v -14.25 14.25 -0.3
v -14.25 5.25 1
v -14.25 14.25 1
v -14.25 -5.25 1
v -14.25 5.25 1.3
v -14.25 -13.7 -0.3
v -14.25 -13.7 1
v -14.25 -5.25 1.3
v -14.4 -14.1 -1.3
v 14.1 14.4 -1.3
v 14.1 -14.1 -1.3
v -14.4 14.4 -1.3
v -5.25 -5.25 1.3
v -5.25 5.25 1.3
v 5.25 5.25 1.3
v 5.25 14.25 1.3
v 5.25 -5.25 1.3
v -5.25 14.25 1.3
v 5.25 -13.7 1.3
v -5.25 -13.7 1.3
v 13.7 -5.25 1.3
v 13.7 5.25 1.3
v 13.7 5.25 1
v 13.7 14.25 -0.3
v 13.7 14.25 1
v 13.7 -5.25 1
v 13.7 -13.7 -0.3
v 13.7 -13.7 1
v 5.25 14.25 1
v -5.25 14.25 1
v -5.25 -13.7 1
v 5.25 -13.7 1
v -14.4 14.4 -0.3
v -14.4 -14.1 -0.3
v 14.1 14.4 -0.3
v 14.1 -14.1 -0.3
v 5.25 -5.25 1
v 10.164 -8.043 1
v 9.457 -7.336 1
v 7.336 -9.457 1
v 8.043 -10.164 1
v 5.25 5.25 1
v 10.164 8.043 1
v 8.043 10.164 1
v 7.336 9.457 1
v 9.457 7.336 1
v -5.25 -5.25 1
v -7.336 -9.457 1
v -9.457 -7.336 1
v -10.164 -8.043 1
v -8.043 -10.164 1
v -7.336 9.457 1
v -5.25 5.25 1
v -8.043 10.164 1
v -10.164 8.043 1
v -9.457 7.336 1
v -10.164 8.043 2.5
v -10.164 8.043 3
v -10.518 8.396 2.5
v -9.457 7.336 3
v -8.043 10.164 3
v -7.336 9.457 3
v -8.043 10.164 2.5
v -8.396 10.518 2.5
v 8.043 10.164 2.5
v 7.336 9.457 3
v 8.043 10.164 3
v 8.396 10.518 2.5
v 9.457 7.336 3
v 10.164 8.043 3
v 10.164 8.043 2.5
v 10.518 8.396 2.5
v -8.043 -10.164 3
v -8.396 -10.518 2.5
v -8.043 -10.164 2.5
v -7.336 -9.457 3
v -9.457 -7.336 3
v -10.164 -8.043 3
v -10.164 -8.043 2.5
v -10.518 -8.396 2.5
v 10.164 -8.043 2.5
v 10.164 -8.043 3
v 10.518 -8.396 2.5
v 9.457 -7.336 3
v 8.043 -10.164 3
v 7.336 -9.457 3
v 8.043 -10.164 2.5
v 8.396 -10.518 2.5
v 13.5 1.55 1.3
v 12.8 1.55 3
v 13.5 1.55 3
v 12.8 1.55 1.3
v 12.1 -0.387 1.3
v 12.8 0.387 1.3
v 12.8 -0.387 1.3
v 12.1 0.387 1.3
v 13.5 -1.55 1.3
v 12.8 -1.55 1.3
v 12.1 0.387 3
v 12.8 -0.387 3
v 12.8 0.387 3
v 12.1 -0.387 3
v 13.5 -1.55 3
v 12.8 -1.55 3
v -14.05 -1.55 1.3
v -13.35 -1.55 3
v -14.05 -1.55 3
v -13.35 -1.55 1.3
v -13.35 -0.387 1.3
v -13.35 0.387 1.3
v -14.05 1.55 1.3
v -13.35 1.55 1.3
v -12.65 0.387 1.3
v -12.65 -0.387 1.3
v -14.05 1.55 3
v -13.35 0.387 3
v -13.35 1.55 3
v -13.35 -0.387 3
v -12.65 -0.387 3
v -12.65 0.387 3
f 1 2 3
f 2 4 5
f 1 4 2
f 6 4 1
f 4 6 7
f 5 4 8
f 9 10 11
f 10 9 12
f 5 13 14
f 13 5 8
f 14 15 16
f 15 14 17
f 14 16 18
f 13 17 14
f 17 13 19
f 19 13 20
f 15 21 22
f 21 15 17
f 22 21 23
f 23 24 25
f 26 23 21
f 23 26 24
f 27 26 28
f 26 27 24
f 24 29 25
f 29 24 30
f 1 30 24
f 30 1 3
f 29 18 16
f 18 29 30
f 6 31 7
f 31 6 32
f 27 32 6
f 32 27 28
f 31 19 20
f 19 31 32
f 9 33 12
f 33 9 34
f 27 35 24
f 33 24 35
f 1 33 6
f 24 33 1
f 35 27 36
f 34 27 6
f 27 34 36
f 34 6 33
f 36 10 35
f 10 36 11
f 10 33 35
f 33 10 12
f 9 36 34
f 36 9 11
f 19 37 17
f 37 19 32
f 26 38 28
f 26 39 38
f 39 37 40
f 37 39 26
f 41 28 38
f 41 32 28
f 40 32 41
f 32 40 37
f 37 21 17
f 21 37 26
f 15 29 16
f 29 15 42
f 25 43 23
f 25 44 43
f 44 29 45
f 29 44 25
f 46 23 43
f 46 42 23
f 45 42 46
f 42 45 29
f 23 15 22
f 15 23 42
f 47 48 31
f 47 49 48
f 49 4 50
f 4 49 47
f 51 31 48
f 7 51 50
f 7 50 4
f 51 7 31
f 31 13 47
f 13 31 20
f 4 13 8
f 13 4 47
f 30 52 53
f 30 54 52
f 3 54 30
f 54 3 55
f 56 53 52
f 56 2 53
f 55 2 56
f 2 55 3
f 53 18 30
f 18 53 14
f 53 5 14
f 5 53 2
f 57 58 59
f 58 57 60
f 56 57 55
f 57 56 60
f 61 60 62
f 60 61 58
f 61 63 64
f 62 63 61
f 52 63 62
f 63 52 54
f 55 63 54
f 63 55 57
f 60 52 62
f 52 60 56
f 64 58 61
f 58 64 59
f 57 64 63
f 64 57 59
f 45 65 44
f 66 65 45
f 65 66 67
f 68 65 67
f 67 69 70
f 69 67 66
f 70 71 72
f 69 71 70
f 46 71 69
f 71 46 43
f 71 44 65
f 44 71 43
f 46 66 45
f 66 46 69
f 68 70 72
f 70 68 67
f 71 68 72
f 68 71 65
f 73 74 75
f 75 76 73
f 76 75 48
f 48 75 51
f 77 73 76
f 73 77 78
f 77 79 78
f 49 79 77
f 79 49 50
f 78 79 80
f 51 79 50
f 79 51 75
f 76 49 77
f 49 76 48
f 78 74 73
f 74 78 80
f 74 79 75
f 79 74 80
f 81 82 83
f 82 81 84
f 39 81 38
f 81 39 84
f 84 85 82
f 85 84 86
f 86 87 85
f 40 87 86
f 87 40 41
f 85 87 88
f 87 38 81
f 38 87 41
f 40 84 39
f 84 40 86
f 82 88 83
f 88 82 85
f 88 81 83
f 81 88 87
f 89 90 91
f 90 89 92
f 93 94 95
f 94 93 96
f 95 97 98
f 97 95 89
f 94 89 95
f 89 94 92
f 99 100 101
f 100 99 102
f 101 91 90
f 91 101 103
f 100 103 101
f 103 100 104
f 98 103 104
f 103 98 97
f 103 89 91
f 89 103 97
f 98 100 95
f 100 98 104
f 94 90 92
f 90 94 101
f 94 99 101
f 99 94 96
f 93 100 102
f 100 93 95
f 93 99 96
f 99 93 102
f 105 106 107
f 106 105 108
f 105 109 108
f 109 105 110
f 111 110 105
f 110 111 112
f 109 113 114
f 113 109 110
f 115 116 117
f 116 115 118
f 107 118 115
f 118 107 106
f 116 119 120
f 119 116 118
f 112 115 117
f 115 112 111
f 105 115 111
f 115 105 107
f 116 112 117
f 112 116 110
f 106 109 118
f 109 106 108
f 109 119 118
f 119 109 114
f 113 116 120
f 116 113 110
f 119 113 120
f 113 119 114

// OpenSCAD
// Copyright (c) Tailscale Inc
// SPDX-License-Identifier: BSD-3-Clause
//
// Framework Desktop Tile with Tailscale Logo
//
// Color scheme:
// - Color 0 (white): tile base
// - Color 1 (gray): corner dots + top center dot
// - Color 2 (black): T-shaped dots (entire middle row + center bottom dot)
//
// Export:
// 1. Run ./export-tailscale-tile.sh to generate all STL files
// 2. Import all STLs into slicer, assign colors
//
// Adapted from https://www.printables.com/model/1397765-framework-desktop-tile-generator CC BY 4.0 https://creativecommons.org/licenses/by/4.0/

// Multi-color export control
// Colors: 0 = white (base), 1 = gray (corner dots), 2 = black (T-shape)
current_color = -1;  // -1 = show all (preview), 0/1/2 = export single color

// Tile dimensions
tile_size = 28.5;      // Width and height of the tile
tile_thickness = 2.6;  // Thickness of the tile
hook_cube = [3.0, 1.0, 2.0];  // Dimensions of the notches

// Bevel and notch parameters
inset_padding = 0.55;              // Size of the inset bevel
hook_offset = 5.5;                 // Distance of notches from edges
inset_corner_depth = 0.3;          // The inset depth of the corners of the tile

// logo parameters - derived from tile size
// tile is 7 dot-units wide: (1.5 dot outer margins; 3 dots; 2 inner margins of 0.5 dot)
dot_unit = tile_size / 7;           // dot-unit (diameter of a dot)
dot_rad = dot_unit / 2;             // dot radius
dot_height = 0.8;                   // height of dots (thicker than layer height for reliable printing)
outer_margin = 1.5 * dot_unit;      // margin from tile edge to outer dot edge
inner_margin = 0.5 * dot_unit;      // gap between adjacent dot edges
dot_spacing = dot_unit + inner_margin;  // center-to-center spacing (1.5 dot units)

// multi-color export
module colorpart(n) {
    if (current_color == -1 || current_color == n) {
        children();
    }
}

// tile base
module tile_base() {
    inset_size = tile_size - inset_padding;
    half_tile = tile_size / 2;

    colorpart(0) color("white") difference() {
        union() {
            translate([inset_padding / 2, inset_padding / 2, 0])
                cube([inset_size, inset_size, tile_thickness], center = true);

            translate([-half_tile + inset_corner_depth / 2, -half_tile + inset_corner_depth / 2, tile_thickness / 2 - 1])
                cube([tile_size, tile_size, 1]);
        }

        corner_cutout = [9, 9, inset_corner_depth];

        // bottom left
        translate([-half_tile, -half_tile, -tile_thickness / 2])
            cube(corner_cutout);

        // bottom right
        translate([-half_tile, half_tile - corner_cutout[1], -tile_thickness / 2])
            cube(corner_cutout);

        // top left
        translate([half_tile - corner_cutout[0], -half_tile, -tile_thickness / 2])
            cube(corner_cutout);

        // top right
        translate([half_tile - corner_cutout[0], half_tile - corner_cutout[1], -tile_thickness / 2])
            cube(corner_cutout);
    }
}

// inset notches with angle and clip
module hook_with_clip(position, angle) {
    translate(position)
        translate([0.0, 0.0, -hook_cube[2] / 2])
        rotate([0, 0, angle]) { // rotate the notch at the specified angle
            union() {
                // base notch cube
                cube(hook_cube, center = true);

                // triangular clip
                translate([-hook_cube[0] / 2, hook_cube[1] / 2, 0]) // position triangle at top of the notch
                    rotate([0, 90, 0])
                    linear_extrude(height = hook_cube[0])
                    polygon(points = [
                        [hook_cube[2] / 2, 0],  // top of triangle
                        [0.5, 0],                  // bottom-right of the triangle
                        [0.5, 0.5]                 // bottom-left of the triangle
                    ]);
            }
        }
}

// add corner notches with clips
module add_hooks() {
    half_tile = tile_size / 2;
    vertical_offset = -tile_thickness / 2 + inset_corner_depth;

    colorpart(0) color("white") {
        hook_with_clip([half_tile - hook_offset, half_tile - hook_offset, vertical_offset], -45);      // top-right
        hook_with_clip([-half_tile + hook_offset, half_tile - hook_offset, vertical_offset], 45);      // top-left
        hook_with_clip([half_tile - hook_offset, -half_tile + hook_offset, vertical_offset], -135);    // bottom-right
        hook_with_clip([-half_tile + hook_offset, -half_tile + hook_offset, vertical_offset], 135);    // bottom-left
    }
}

// create a T-shaped notch
module constraint(position) {
    constraint_cube = [3.1, 0.7, 1.7];
    translate(position) {
    translate([0.0, 0.0, -constraint_cube[2] / 2]) {
            // base notch cube
            cube(constraint_cube, center = true);

            // perpendicular cube for T-shape
            translate([0, -constraint_cube[1], 0])
                cube([constraint_cube[0] / 4, constraint_cube[1], constraint_cube[2]], center = true);
        }
    }
}

// add edge constraints (T-shaped notches)
module add_constraints() {
    half_tile = tile_size / 2;

    colorpart(0) color("white") {
        // Left edge
        rotate([0, 0, 90])
            constraint([0, half_tile - inset_padding * 2, -tile_thickness / 2]);

        // Right edge
        rotate([0, 0, -90])
            constraint([0, half_tile - inset_padding, -tile_thickness / 2]);
    }
}

// complete Framework tile with hooks and constraints
module framework_tile() {
    tile_base();
    add_hooks();
    add_constraints();
}

// individual dot - creates a cylinder flush with the surface
module dot(x, y) {
    // first dot center is at: outer_margin + dot_rad = 2.0 dot_units from edge
    first_dot_center = outer_margin + dot_rad;
    translate([first_dot_center + x * dot_spacing, first_dot_center + y * dot_spacing, 0])
        cylinder(h=dot_height, r=dot_rad, center=false);
}

// gray dots: corners + top center
module gray_dots() {
    colorpart(1) translate([0, 0, tile_thickness/2 - dot_height])
        color("gray") {
            dot(0, 0);  // bottom-left
            dot(2, 0);  // bottom-right
            dot(0, 2);  // top-left
            dot(1, 2);  // top-center
            dot(2, 2);  // top-right
        }
}

// black dots: T-shaped pattern
module accent_dots() {
    colorpart(2) translate([0, 0, tile_thickness/2 - dot_height])
        color("black") {
            dot(0, 1);  // left middle
            dot(1, 1);  // center middle
            dot(2, 1);  // right middle
            dot(1, 0);  // center bottom
        }
}

// all dots combined (for cutting recesses in base)
module all_dots() {
    translate([0, 0, tile_thickness/2 - dot_height]) {
        for (x = [0:2], y = [0:2]) dot(x, y);
    }
}

// tile with Tailscale logo
module tailscale_tile() {
    half_tile = tile_size / 2;

    // create recesses for the dot matrix
    // dots are positioned relative to tile corner, so offset by -half_tile
    difference() {
        framework_tile();
        translate([-half_tile, -half_tile, 0])
            all_dots();
    }

    // populate the gray & black dots
    translate([-half_tile, -half_tile, 0]) {
        gray_dots();
        accent_dots();
    }
}

// render flipped for printing
$fs = 0.15;
rotate([0, 180, 0])
    tailscale_tile();
